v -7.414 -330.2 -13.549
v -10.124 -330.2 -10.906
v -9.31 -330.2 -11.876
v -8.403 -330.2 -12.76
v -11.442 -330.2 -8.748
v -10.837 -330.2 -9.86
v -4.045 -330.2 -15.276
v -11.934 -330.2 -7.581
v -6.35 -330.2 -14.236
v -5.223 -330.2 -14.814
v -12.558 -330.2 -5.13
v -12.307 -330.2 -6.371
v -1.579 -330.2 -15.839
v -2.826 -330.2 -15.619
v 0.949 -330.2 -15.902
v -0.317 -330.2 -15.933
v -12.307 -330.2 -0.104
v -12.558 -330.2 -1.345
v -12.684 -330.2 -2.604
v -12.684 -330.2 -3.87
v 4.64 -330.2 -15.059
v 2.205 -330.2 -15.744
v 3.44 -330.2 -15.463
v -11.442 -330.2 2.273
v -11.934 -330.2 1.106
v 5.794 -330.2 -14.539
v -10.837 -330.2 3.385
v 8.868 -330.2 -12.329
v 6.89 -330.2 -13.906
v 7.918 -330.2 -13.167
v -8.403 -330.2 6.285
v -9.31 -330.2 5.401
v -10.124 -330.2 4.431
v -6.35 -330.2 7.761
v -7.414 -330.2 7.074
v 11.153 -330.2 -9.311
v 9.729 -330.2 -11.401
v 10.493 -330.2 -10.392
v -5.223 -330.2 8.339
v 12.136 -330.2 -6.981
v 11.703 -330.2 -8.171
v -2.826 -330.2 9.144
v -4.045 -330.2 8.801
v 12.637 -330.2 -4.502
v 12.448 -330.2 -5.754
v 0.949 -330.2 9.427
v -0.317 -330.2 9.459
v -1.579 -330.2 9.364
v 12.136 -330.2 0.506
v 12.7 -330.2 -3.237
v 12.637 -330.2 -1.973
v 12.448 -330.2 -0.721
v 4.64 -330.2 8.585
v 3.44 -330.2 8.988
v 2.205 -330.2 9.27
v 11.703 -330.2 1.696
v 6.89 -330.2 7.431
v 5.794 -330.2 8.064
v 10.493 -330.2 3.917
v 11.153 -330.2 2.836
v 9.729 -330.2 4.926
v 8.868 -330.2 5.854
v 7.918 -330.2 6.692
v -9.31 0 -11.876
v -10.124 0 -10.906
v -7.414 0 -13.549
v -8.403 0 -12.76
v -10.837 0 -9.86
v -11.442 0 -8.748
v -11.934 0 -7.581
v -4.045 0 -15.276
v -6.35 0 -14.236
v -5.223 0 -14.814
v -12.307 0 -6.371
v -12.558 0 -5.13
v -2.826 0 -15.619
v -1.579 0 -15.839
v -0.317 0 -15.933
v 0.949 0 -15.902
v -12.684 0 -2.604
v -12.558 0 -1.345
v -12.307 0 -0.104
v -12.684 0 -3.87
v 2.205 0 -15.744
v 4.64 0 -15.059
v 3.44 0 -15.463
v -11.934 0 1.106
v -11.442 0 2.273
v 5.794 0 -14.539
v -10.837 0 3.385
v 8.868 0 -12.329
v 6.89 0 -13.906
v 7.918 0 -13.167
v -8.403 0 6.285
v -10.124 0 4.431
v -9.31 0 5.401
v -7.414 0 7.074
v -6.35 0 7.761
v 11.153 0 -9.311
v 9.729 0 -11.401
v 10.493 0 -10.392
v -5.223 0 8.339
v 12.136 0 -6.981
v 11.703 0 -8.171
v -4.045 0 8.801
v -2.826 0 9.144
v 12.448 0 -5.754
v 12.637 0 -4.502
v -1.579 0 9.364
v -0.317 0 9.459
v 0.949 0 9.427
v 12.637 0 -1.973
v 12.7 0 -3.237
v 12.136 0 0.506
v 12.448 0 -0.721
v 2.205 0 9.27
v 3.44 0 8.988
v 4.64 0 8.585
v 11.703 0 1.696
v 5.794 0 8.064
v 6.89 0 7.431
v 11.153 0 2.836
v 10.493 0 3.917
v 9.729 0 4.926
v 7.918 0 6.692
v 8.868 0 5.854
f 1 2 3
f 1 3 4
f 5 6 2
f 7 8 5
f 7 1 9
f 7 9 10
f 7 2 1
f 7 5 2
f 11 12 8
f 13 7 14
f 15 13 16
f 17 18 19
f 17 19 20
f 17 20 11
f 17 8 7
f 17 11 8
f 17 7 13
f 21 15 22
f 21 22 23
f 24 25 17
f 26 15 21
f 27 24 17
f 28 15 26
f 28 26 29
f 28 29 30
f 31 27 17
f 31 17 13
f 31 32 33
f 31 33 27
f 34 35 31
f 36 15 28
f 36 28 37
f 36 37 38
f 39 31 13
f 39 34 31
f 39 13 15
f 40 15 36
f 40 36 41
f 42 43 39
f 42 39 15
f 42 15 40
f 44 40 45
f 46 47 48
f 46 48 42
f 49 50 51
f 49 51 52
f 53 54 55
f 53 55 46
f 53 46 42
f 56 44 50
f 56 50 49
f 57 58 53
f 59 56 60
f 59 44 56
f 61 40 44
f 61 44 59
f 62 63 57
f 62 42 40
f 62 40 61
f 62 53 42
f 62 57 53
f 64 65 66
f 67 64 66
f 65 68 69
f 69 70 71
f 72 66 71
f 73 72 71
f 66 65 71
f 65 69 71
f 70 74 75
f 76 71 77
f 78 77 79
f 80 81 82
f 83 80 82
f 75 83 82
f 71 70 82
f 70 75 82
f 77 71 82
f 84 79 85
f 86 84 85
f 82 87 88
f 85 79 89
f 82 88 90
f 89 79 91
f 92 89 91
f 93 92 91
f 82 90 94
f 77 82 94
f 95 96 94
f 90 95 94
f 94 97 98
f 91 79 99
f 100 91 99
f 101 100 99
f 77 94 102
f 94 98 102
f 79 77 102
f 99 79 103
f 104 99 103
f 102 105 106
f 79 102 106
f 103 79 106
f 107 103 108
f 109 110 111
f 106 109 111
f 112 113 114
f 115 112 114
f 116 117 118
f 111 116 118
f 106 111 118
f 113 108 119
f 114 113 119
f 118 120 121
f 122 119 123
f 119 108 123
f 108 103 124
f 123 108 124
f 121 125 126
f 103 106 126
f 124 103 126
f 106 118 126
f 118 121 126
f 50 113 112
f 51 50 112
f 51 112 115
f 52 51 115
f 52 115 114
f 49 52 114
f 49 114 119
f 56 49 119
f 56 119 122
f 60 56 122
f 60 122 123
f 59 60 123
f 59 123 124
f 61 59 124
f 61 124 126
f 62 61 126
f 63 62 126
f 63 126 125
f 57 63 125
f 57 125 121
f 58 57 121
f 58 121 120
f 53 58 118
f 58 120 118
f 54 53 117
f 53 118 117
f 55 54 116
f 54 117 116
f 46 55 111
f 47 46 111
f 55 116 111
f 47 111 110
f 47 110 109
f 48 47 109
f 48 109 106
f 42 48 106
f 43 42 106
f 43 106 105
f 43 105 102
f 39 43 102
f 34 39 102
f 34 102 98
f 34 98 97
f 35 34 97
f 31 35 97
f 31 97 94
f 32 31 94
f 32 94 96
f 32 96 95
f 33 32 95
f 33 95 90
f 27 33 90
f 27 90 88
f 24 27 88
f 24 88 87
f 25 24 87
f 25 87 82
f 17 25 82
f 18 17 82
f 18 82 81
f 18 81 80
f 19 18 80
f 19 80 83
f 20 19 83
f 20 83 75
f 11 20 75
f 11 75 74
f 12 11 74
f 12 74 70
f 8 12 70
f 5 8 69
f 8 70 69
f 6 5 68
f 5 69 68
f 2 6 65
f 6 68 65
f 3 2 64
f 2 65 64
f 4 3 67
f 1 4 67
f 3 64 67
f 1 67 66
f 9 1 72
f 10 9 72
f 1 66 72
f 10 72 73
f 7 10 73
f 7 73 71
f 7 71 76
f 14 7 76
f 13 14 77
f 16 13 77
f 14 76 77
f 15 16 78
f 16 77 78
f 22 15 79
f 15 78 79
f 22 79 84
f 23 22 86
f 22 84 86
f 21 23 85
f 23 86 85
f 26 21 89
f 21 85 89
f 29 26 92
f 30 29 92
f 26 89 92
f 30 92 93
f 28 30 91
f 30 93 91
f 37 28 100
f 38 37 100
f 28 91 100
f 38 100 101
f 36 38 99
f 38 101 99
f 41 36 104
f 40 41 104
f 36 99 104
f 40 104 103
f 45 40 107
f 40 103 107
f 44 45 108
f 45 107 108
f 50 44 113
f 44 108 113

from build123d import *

# Parameters (mm, degrees)
F0_R     = 12.7
F1_DEPTH = 508
F2_DEPTH = 127
F3_DEPTH = 50.8


with BuildPart() as f1:
    # F0 (on Front) → F1 (new body)
    with BuildSketch(Plane.XZ):
        with Locations((0, -3.2373953145)):
            Circle(F0_R)
    extrude(amount=F1_DEPTH)

    # F2 (cut): a face of the model
    f2_faces = [f1.faces().sort_by_distance(p)[0] for p in [
        (0, -508, -3.2373953145),
    ]]
    extrude(f2_faces, amount=-F2_DEPTH, mode=Mode.SUBTRACT)

    # F3 (cut): a face of the model
    f3_faces = [f1.faces().sort_by_distance(p)[0] for p in [
        (0, -381, -3.2373953145),
    ]]
    extrude(f3_faces, amount=-F3_DEPTH, mode=Mode.SUBTRACT)


solid = f1.part
